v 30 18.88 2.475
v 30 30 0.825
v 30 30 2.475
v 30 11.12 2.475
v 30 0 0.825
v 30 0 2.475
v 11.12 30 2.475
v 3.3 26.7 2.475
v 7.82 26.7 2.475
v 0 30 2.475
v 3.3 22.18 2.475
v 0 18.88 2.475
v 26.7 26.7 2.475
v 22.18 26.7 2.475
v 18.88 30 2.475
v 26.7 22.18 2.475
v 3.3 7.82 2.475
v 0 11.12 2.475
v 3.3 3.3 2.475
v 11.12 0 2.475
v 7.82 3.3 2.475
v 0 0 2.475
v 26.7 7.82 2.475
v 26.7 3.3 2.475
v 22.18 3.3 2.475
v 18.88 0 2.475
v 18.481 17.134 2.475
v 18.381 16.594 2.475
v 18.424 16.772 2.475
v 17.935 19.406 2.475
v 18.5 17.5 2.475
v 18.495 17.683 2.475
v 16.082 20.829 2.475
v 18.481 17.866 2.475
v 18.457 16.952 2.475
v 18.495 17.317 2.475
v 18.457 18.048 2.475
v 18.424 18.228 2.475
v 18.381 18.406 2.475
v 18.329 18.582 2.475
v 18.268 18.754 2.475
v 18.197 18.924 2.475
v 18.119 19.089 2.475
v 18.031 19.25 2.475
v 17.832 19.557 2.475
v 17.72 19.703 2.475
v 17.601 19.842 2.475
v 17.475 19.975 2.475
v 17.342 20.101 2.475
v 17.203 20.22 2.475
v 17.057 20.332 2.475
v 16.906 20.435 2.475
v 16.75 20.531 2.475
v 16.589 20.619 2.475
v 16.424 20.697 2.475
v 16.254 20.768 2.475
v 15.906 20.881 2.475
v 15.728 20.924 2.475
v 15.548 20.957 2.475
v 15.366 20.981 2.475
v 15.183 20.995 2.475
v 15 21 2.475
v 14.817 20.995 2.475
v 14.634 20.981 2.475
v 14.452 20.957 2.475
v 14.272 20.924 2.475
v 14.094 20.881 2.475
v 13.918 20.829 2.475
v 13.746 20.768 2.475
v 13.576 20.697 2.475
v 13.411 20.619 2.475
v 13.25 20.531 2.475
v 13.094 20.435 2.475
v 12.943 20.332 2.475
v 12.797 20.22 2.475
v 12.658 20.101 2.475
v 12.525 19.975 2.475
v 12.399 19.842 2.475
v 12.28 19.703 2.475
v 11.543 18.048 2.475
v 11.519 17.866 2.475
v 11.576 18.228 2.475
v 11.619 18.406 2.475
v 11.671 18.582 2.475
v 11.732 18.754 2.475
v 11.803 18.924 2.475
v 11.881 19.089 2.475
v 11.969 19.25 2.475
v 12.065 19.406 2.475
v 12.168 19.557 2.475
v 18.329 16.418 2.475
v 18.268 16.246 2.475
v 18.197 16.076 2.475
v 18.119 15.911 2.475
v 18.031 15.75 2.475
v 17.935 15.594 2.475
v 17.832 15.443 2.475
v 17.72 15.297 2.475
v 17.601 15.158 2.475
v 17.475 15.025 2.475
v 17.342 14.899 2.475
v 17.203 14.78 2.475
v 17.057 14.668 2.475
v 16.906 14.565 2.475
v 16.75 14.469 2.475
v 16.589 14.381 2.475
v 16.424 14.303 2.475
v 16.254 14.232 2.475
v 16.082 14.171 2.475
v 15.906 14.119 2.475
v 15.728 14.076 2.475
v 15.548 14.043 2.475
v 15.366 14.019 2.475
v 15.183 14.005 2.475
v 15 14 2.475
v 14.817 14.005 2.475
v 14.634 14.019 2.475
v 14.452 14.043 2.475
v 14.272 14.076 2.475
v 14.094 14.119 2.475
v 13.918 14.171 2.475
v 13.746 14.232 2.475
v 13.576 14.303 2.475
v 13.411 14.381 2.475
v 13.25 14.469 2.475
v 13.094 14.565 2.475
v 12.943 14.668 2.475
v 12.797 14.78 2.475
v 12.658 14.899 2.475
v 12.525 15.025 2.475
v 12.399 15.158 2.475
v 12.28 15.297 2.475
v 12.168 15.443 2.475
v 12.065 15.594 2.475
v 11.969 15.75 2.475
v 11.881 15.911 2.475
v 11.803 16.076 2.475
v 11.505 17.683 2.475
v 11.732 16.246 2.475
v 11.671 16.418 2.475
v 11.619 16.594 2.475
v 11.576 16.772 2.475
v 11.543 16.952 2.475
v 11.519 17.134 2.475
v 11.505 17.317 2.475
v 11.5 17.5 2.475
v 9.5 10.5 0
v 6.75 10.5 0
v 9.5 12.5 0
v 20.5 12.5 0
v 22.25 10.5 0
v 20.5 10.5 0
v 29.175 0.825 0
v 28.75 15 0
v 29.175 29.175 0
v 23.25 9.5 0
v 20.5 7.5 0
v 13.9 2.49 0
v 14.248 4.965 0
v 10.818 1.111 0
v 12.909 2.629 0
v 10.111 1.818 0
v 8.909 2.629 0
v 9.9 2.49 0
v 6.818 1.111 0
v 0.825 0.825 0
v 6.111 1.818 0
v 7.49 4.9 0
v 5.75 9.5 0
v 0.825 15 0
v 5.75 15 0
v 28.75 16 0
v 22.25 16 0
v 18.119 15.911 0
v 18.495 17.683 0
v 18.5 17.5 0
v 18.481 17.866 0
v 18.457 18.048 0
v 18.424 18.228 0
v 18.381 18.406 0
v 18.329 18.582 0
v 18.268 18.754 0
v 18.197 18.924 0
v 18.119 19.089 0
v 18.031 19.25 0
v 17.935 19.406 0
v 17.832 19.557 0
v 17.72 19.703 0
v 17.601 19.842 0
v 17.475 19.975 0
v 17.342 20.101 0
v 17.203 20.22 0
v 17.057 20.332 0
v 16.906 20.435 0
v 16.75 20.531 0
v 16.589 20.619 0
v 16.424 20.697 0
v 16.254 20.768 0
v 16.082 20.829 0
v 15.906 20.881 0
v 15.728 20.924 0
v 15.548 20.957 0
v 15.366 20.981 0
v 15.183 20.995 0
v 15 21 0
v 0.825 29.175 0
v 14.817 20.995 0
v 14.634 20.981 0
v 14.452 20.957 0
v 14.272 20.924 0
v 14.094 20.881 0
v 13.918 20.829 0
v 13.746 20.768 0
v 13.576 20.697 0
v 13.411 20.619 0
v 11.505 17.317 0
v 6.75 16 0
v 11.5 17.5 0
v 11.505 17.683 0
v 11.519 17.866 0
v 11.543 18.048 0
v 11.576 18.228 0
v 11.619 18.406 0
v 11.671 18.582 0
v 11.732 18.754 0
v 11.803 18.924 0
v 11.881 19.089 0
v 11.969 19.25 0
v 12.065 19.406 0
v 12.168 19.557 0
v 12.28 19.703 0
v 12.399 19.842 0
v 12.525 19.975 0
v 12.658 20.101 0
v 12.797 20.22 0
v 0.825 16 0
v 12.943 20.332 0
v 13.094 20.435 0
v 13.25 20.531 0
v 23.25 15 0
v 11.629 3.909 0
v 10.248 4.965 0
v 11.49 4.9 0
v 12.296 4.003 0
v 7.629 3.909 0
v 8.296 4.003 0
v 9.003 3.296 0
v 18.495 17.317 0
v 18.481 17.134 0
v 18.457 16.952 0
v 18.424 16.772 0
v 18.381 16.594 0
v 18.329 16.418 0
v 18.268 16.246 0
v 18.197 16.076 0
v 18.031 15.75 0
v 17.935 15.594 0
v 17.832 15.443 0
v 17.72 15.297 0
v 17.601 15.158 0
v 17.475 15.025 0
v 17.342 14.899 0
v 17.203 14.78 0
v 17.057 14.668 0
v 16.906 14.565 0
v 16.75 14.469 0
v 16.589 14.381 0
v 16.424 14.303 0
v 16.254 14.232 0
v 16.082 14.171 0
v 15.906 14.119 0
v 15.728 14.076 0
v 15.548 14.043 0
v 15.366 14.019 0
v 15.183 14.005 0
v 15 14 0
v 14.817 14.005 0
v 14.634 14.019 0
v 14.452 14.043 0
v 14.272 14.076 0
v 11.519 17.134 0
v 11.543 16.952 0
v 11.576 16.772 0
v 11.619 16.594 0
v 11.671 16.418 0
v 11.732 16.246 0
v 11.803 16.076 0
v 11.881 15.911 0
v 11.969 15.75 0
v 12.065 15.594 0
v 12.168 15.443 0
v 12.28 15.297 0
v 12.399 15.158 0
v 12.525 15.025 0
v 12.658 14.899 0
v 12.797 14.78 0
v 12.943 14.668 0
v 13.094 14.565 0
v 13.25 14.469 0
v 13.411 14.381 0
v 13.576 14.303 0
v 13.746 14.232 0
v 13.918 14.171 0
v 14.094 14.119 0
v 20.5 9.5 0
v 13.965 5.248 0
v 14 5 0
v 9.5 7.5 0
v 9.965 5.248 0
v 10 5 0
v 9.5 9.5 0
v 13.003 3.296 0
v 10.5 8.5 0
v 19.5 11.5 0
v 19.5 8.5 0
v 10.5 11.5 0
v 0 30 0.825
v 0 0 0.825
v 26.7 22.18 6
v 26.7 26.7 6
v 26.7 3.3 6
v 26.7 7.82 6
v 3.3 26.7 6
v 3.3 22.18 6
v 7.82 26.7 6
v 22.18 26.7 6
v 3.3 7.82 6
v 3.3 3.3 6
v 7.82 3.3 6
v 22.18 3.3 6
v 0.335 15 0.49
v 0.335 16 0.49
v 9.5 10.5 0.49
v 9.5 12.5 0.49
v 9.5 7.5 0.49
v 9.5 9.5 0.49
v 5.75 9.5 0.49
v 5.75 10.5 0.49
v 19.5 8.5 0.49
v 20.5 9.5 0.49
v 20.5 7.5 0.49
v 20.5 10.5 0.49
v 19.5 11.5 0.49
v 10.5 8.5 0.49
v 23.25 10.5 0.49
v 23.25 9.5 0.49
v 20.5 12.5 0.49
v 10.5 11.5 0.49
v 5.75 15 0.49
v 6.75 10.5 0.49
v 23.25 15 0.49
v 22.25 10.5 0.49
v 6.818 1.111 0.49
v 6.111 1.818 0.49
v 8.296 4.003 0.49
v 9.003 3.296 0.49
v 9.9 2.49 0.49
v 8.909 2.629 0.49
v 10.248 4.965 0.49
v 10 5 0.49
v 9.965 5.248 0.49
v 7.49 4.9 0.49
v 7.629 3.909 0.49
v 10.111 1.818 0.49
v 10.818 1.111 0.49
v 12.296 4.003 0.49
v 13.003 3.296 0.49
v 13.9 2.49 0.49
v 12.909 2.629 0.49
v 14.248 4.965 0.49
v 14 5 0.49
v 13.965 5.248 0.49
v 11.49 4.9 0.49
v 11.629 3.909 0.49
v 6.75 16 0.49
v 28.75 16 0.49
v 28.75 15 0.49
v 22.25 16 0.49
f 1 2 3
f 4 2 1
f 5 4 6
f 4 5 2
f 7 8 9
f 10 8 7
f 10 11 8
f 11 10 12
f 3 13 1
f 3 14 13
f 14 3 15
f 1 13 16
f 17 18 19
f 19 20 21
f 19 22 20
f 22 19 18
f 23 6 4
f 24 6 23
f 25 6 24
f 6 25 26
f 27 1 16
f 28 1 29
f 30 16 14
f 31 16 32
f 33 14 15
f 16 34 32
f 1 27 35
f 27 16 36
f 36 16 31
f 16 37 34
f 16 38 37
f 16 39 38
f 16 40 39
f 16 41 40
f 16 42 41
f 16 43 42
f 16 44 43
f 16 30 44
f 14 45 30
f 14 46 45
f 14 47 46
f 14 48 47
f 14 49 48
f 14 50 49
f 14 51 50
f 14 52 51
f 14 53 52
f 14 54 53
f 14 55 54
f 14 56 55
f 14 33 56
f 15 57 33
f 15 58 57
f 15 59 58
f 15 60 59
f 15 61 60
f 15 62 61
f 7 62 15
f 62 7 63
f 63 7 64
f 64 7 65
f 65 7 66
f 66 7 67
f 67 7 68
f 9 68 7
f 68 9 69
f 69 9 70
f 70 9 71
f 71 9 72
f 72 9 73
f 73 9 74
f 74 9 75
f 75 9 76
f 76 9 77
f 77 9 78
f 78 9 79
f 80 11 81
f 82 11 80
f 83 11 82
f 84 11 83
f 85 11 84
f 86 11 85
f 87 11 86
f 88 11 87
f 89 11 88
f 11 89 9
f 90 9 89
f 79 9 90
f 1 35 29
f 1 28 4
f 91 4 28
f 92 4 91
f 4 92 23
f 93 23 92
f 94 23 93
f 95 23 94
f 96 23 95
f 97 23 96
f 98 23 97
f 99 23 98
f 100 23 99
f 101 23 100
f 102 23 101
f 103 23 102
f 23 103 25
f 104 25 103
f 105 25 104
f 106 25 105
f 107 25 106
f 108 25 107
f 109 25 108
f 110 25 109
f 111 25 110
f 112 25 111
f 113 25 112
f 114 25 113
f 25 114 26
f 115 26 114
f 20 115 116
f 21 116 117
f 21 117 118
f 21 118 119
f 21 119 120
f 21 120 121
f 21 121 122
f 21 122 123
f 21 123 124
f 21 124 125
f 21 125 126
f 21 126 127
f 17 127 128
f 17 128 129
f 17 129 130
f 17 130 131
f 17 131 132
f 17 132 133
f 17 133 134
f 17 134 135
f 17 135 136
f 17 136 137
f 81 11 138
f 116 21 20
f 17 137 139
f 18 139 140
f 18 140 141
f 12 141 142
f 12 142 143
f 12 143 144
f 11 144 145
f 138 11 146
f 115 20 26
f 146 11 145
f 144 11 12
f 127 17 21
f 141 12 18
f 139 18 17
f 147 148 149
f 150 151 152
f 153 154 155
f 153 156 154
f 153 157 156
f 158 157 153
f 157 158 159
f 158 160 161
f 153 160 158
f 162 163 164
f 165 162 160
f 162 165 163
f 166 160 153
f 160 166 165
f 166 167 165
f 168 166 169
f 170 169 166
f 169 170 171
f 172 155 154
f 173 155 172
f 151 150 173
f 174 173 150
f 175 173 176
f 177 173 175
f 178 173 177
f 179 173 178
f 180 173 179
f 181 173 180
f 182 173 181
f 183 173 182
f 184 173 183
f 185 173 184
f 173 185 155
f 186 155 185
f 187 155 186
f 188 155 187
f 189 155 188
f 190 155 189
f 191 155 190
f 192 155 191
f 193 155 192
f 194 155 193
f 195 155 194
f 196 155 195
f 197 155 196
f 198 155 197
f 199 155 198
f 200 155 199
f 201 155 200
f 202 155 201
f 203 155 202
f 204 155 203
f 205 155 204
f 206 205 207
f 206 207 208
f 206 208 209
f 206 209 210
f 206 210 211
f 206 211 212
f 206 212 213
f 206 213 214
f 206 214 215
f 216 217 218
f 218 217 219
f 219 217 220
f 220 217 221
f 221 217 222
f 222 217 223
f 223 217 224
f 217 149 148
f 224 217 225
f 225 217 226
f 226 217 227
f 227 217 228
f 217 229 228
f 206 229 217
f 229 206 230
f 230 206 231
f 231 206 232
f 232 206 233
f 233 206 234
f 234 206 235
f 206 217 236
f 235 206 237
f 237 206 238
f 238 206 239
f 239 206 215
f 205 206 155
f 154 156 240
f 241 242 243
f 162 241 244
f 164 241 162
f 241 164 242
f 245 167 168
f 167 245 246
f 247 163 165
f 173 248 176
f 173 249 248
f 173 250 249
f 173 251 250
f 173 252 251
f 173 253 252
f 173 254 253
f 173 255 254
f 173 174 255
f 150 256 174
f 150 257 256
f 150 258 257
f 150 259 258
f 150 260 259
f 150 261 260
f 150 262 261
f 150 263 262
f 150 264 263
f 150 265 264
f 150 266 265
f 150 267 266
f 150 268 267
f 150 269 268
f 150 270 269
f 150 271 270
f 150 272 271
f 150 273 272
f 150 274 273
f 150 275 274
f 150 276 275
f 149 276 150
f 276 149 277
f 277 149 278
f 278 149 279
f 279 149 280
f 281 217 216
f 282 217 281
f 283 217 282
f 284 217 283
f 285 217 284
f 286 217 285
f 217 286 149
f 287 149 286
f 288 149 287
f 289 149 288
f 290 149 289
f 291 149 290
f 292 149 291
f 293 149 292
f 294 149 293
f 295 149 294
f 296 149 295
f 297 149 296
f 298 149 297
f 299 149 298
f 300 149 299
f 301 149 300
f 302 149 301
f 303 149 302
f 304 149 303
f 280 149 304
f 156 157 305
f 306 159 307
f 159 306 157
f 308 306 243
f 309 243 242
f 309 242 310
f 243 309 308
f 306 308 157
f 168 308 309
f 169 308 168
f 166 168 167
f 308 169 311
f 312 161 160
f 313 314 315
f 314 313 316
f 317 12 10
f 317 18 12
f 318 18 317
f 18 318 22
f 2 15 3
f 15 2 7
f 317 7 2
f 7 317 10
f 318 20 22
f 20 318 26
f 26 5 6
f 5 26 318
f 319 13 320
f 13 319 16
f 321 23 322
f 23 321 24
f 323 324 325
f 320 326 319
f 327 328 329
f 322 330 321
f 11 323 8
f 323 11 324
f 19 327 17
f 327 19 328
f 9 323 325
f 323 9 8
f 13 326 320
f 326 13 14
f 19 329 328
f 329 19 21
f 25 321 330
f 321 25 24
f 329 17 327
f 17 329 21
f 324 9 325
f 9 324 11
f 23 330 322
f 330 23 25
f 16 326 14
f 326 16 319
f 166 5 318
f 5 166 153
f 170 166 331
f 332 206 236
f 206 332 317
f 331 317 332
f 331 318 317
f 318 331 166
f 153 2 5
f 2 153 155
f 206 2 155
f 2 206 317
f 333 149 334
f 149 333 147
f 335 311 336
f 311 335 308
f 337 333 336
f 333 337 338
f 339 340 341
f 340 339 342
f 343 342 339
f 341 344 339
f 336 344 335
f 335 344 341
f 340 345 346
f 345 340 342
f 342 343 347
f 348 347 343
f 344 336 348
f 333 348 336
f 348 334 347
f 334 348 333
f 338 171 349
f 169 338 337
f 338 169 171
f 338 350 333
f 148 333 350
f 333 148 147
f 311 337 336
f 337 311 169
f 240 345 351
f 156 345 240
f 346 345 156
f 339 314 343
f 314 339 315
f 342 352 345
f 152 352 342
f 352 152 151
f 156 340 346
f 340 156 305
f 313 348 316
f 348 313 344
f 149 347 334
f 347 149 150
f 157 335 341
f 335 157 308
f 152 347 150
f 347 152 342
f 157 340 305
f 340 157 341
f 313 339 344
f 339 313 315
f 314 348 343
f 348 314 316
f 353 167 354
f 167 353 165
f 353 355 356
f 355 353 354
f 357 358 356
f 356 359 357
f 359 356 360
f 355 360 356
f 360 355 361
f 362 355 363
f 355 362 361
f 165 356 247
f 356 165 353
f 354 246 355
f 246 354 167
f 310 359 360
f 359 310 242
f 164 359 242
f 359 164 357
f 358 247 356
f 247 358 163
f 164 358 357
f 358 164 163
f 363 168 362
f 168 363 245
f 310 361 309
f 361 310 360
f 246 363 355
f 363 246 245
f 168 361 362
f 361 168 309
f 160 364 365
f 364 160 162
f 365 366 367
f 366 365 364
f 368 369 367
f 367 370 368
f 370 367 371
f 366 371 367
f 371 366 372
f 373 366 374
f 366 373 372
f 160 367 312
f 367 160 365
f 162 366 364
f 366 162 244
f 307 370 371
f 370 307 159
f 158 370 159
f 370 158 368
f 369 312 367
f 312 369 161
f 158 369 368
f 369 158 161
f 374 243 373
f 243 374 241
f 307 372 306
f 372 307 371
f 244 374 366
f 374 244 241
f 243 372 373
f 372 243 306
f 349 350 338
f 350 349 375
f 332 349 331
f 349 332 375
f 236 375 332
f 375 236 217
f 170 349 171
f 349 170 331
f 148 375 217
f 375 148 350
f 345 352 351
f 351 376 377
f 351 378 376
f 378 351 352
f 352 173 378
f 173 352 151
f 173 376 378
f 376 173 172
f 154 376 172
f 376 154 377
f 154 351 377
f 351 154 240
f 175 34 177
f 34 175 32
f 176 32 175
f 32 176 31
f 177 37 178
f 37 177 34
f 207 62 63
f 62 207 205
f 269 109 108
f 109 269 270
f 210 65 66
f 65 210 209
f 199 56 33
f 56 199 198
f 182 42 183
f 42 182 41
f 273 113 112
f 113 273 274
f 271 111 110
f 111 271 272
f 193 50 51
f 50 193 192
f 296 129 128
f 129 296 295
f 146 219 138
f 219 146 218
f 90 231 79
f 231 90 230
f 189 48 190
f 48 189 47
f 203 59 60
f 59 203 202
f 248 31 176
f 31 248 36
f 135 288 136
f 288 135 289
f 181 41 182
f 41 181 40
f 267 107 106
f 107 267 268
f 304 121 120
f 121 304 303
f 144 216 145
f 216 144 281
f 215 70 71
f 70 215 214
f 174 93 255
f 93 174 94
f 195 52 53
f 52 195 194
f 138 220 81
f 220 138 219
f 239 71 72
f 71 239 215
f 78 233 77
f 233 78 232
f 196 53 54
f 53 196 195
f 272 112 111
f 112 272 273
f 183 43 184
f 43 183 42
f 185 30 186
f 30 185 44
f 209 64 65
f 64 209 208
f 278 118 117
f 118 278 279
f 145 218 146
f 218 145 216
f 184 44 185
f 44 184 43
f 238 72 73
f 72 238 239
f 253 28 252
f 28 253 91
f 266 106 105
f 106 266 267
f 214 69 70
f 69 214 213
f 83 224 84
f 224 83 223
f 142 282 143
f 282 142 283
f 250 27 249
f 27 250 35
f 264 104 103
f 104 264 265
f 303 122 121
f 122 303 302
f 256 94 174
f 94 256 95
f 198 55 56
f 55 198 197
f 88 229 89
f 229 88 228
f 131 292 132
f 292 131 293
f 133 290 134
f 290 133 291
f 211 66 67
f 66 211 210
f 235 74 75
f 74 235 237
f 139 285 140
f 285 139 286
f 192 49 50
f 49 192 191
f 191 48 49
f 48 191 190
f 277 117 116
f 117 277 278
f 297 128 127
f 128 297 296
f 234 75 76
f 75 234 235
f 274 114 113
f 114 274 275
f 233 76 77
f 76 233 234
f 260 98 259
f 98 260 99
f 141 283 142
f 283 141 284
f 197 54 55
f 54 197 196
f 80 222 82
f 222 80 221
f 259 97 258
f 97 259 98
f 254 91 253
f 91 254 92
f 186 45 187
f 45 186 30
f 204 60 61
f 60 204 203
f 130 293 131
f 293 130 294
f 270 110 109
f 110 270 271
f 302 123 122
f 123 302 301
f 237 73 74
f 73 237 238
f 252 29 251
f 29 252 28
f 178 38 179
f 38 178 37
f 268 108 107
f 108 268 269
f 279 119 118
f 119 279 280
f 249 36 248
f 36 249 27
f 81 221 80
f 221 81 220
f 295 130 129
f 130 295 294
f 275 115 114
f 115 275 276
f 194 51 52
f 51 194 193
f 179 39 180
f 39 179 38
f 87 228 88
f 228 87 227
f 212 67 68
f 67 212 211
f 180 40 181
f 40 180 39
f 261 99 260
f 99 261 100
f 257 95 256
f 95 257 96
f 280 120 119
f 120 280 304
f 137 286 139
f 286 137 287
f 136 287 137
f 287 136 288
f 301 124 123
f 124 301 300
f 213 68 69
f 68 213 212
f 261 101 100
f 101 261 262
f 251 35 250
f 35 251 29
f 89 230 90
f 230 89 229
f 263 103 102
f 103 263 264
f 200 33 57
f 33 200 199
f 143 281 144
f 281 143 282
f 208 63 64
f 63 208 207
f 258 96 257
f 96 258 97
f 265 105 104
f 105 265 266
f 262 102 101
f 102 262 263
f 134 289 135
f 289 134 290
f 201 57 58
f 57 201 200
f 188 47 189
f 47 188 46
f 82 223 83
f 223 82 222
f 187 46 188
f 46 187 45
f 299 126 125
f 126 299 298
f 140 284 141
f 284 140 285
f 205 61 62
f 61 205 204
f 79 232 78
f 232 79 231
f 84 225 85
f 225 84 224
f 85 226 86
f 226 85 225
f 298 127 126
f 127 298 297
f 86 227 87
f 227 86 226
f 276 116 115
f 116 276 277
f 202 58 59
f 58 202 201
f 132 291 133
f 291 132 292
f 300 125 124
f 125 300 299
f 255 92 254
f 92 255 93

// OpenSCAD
// file: settings.scad
cube_width=30;
cube_height=16;
cube_thickness=3.3;

cap_width=30;
cap_height=6;
cap_thickness=3.3;

glyph_depth=0.5;
glyph_thickness=1;
// file: sym_arrow.scad
module arrow(thickness, length, size, height)
{
    translate([thickness,-thickness/2])cube([length-thickness, thickness, height]);
    rotate([0,0,37])translate([0,-3*thickness/4])cube([size, thickness, height]);
    rotate([0,0,-37])translate([0,-thickness/4])cube([size, thickness, height]);
}
// file: sym_resistor.scad
module resistor(length, width, thickness, height)
{
    translate([0,-thickness/2,0])cube([length/2-width, thickness, height]);
    translate([length/2+width,-thickness/2,0])cube([length/2-width, thickness, height]);
    
    translate([length/2-width,-width/2, 0])cube([thickness, width, height]);
    translate([length/2+width,-width/2,0])cube([thickness, width, height]);
    translate([length/2-width,-width/2, 0])cube([2*width, thickness, height]);
    translate([length/2-width, width/2-thickness, 0])cube([2*width, thickness, height]);
}

resistor(30, 8, 1, 1);
// file: cap_1x1.scad
include <settings.scad>

module cap_1x1(width, height, thickness)
{
    width1=width-thickness;
    difference()
    {
        union()
        {
            cube([width, width, thickness*3/4]);
            translate([thickness,thickness,0])cube([width-2*thickness, width-2*thickness, height]);
        }
        union()
        {
            translate([width/2,width/2,0])rotate([0,0,45])translate([-width1/2,-width1/2,thickness*3/4]) cube([width1,width1,height]);
                        //corners
            translate([0,0.25*thickness,0])rotate([45,0,0]) translate([-0.5*width, -width, -0.5*height]) cube([2*width, width, 2*height]);
            translate([0.25*thickness,0,0]) rotate([0,-45,0]) translate([-width, -0.5*width, -0.5*height]) cube([width, 2*width, 2*height]);
            translate([width-0.25*thickness,0,0]) rotate([0,45,0]) translate([0, 0, -0.5*height]) cube([width, 2*width, 2*height]);
            translate([0,width-0.25*thickness,0]) rotate([-45,0,0]) translate([-0.5*width, 0, -0.5*height]) cube([2*width, width, 2*height]);
        }
    }
}

cap_1x1(cap_width, cap_height, cap_thickness);
//ring(10,1,1);
//arrow(1, 20, 3, 1);
//transistor_npn(30, 1, 1);
// main file
use <cap_1x1.scad>
use <sym_resistor.scad>
use <sym_arrow.scad>
include <settings.scad>

module cap_1x1_photoresistor(width, height, thickness)
{
    difference()
    {
        cap_1x1(width, height, thickness);
        translate([0,width/2,-0.01])cube([2.5*width/12, glyph_thickness, glyph_depth]);
        translate([2.3*width/12,4*width/12,-0.01]) cube([glyph_thickness,2*width/12+glyph_thickness,glyph_depth]);
        translate([2.3*width/12, 4*width/12,-0.01])resistor(7*width/12, width/6, glyph_thickness, glyph_depth);
        translate([8.9*width/12,4*width/12,-0.01]) cube([glyph_thickness,2*width/12+glyph_thickness,glyph_depth]);
        translate([9*width/12,width/2,-0.01])cube([2.5*width/12, glyph_thickness, glyph_depth]);
        
        translate([width/3,width/6,-0.01])rotate([0,0,-135]) arrow(glyph_thickness, width/6, 2.5, glyph_depth);
        translate([2.8*width/6,width/6,-0.01])rotate([0,0,-135]) arrow(glyph_thickness, width/6, 2.5, glyph_depth);
        
        translate([width/2,7*width/12,-0.1])cylinder(r=3.5, h=thickness, $fn=120);
    }
    
    
}

cap_1x1_photoresistor(cap_width, cap_height, cap_thickness);
